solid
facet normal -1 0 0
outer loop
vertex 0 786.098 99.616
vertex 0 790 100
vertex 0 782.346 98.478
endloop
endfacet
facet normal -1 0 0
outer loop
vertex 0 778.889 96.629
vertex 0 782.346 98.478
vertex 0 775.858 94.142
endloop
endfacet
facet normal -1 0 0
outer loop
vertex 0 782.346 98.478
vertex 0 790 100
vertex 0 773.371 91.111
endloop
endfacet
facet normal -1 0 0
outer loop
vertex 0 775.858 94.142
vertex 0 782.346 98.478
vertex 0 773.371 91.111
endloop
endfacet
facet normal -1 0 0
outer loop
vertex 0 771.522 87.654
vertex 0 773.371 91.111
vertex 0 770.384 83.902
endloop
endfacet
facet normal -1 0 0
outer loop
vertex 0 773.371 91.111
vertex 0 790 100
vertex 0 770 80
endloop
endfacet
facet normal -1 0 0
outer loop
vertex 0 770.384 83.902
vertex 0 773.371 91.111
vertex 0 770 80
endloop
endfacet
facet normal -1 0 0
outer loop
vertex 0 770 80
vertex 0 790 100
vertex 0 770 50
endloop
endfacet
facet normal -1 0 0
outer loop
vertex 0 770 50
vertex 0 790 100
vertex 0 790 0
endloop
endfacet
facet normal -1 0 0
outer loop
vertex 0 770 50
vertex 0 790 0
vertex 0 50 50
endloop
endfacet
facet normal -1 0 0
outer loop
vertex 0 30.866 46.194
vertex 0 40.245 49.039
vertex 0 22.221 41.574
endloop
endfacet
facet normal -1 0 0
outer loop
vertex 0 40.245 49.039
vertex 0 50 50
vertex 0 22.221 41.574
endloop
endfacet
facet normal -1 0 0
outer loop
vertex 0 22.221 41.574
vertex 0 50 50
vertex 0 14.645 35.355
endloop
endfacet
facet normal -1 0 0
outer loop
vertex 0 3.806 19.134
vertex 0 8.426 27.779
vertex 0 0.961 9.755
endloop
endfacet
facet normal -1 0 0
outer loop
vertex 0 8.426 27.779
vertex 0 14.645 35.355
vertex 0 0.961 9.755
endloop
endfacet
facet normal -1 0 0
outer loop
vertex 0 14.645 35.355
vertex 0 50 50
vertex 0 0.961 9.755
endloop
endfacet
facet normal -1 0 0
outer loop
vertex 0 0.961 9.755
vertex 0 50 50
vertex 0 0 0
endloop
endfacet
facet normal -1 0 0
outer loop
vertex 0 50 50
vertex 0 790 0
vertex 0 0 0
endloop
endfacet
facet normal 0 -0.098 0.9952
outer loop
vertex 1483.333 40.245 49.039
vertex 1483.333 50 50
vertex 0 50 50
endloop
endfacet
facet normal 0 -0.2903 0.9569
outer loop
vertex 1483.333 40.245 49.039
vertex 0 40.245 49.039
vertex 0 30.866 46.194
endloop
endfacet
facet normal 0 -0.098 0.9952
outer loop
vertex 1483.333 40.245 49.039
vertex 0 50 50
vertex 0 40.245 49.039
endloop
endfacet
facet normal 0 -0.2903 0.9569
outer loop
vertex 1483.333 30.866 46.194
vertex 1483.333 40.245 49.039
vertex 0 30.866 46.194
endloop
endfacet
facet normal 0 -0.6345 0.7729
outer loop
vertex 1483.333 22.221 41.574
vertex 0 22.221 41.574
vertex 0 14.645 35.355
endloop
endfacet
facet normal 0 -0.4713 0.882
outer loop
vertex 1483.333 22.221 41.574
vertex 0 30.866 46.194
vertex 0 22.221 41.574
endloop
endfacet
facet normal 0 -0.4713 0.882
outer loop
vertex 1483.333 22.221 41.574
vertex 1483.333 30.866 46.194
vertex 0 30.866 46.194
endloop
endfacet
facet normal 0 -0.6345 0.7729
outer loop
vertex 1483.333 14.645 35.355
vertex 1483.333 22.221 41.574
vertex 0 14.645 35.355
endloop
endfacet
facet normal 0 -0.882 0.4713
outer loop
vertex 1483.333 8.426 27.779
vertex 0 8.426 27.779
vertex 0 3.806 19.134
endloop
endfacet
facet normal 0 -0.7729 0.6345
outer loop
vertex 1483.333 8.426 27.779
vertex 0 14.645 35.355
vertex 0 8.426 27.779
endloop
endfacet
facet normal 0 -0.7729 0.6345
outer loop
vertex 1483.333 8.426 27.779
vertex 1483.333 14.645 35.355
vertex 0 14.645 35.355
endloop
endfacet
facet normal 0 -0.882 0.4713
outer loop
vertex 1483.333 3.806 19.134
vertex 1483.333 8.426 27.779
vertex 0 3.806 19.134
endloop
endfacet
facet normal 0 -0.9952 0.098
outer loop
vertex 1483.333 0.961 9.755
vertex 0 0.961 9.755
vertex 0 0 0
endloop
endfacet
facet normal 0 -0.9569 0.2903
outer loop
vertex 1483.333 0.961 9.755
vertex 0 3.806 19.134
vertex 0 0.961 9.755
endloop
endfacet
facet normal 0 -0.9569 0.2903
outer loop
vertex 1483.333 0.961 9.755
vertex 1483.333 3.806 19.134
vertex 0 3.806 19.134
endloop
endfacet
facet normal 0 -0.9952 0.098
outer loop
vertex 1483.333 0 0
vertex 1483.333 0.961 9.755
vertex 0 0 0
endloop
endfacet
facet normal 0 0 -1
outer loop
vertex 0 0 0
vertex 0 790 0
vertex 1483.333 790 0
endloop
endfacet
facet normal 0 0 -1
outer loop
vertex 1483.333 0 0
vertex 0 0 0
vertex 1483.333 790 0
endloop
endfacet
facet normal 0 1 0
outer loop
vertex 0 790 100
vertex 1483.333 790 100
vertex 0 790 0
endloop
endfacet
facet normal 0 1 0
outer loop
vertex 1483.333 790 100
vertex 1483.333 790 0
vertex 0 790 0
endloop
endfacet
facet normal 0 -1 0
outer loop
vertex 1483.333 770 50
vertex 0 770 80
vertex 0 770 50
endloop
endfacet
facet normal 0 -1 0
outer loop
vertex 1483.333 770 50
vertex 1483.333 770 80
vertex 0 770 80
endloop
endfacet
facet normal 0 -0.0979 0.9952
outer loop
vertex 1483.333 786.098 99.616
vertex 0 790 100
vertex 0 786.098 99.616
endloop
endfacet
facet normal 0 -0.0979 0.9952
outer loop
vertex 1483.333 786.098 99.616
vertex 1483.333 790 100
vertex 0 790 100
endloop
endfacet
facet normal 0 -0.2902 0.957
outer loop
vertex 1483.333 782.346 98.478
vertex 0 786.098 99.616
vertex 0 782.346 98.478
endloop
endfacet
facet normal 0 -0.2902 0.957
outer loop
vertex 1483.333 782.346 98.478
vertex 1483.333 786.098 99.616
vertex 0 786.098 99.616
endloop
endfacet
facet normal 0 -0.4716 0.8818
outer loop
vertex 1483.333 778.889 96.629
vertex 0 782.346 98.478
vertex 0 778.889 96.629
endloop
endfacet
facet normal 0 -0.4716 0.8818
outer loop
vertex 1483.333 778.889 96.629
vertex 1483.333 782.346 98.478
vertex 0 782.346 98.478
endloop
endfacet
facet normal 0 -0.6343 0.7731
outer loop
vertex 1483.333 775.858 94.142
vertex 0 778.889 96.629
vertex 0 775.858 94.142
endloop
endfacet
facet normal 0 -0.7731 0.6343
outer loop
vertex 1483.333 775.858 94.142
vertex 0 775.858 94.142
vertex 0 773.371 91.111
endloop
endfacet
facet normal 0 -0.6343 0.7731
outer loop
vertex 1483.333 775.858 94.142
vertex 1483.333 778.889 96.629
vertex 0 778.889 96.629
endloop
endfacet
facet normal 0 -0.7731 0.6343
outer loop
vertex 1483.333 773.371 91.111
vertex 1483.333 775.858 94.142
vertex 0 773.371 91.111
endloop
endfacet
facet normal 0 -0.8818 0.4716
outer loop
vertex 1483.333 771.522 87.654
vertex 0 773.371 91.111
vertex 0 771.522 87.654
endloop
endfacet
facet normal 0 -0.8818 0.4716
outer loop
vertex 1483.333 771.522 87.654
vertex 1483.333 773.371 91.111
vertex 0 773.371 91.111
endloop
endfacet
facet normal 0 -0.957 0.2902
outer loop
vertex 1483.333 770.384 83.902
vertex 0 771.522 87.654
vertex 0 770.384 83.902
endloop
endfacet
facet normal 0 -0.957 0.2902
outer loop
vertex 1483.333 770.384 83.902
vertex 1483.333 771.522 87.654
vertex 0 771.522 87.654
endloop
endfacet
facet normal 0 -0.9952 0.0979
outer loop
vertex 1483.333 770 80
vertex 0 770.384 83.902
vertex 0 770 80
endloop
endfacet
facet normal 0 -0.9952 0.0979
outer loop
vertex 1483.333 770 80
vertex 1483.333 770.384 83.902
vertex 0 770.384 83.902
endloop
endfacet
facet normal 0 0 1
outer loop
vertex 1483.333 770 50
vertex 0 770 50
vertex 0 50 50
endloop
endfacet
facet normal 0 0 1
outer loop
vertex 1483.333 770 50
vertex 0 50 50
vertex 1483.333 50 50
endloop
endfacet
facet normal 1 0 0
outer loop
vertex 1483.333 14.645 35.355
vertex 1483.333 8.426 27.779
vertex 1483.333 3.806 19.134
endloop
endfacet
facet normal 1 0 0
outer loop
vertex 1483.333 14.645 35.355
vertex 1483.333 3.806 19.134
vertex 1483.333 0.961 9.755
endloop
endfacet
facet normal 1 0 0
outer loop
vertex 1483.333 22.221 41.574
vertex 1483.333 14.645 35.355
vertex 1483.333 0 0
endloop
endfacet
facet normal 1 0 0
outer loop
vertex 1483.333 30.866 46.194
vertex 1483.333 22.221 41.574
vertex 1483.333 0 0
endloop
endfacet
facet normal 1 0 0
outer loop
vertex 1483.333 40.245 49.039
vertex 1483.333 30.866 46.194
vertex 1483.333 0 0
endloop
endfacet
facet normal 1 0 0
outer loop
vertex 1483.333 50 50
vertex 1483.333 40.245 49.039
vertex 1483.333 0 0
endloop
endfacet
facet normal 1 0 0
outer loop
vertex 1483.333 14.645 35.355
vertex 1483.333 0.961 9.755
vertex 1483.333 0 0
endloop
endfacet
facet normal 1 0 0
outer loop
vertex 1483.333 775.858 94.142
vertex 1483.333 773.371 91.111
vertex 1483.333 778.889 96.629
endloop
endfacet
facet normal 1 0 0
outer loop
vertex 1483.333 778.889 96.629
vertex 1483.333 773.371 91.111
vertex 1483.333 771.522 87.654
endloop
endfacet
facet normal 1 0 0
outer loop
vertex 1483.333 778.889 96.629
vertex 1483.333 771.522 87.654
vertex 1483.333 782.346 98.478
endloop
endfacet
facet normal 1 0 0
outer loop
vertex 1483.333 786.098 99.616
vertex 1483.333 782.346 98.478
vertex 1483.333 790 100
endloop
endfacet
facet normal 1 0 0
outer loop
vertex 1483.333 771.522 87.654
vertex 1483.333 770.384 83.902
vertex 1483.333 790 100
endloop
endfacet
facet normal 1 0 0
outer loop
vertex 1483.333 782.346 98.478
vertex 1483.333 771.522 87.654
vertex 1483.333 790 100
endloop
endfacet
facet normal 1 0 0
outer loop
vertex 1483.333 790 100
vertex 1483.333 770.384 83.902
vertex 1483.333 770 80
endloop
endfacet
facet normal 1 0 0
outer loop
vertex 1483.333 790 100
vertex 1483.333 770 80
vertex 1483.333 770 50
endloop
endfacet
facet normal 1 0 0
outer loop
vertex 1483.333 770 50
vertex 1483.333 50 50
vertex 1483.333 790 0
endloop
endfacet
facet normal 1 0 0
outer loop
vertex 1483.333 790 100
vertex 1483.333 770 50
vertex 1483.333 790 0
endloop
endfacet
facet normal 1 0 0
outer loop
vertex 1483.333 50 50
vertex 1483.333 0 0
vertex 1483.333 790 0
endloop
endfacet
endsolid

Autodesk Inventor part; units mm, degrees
ref_plane "YZ Plane" through (0, 0, 0) normal (1, 0, 0) x (0, 1, 0)
ref_plane "XZ Plane" through (0, 0, 0) normal (0, 1, 0) x (-1, 0, 0)
ref_plane "XY Plane" through (0, 0, 0) normal (0, 0, 1) x (1, 0, 0)
sketch "Sketch1" plane through (0, 0, 0) normal (0, 0, 1) x (1, 0, 0)
  line L0 (0, 0) -> (1483.3333, 0)
  line L1 (1483.3333, 0) -> (1483.3333, 790)
  line L2 (1483.3333, 790) -> (0, 790)
  line L3 (0, 790) -> (0, 0)
  dimension "ancho" = 1483.3333
  dimension "d1" = 790
extrude "Extrusion1" add sketch "Sketch1" along normal blind 50
fillet "Fillet1" radius 50 1 edges at (741.6667, 0, 50)
sketch "Sketch2" plane through (1483.3333, 790, 50) normal (1, 0, 0) x (0, 0, -1)
  line L0 (50, 0) -> (-50, 0)
  line L1 (-50, 0) -> (-50, 0)
  line L2 (-30, -20) -> (50, -20)
  line L3 (50, -20) -> (50, 0)
  arc A0 (-50, 0) -> (-30, -20) centre (-30, 0) ccw
  point P0 (50, -790)
  point P1 (-50, -20)
  dimension "d5" = 100
  dimension "d6" = 20
  dimension "d7" = 20
extrude "Extrusion2" add sketch "Sketch2" against normal up to surface (1483.3333 mm away)
properties part number "meson"
